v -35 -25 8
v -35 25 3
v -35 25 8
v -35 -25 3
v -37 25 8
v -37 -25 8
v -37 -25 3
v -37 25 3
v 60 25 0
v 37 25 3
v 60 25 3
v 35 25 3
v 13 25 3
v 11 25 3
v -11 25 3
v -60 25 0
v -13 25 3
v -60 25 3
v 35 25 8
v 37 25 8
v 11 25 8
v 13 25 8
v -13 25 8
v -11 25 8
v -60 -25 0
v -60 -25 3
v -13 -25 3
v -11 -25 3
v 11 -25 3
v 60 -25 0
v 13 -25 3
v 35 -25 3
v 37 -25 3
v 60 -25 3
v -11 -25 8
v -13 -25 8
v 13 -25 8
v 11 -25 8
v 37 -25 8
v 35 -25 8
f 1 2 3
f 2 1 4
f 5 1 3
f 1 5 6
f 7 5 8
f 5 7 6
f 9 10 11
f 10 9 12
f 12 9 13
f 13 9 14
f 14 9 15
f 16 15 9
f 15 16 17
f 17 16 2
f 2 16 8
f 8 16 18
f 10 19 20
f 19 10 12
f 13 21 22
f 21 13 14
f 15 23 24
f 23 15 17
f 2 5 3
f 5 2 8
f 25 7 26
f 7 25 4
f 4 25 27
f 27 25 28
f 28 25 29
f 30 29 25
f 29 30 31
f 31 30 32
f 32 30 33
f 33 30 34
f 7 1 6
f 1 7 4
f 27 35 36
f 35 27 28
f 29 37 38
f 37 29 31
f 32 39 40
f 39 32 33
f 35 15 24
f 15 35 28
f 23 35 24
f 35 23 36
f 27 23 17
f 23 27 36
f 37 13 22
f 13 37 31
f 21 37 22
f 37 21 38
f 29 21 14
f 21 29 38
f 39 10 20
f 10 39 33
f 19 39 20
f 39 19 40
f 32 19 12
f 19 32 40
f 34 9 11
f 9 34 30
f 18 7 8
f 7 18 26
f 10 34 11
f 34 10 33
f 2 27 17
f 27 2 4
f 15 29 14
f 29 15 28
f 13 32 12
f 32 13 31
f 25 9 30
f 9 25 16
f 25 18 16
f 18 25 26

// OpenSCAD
// Stiffened cover panel
// Units: mm. Print orientation: plate flat on the bed, ribs pointing up (+Z).

// ---- Plate ----
plate_len   = 120;   // plate length along X
plate_wid   = 50;    // plate width along Y
plate_thk   = 3;     // plate thickness (z = 0 to 3)

// ---- Ribs ----
rib_count   = 4;     // number of ribs
rib_thk     = 2;     // rib thickness along X
rib_h       = 5;     // rib height above plate (z = 3 to 8)
rib_pitch   = plate_len / (rib_count + 1);  // 24 mm centre-to-centre spacing
rib_overlap = 0.01;  // small overlap into plate for a clean union

// ---- Model ----
union() {
    // Base plate, centred in X and Y
    translate([-plate_len/2, -plate_wid/2, 0])
        cube([plate_len, plate_wid, plate_thk]);

    // Ribs: centres at -36, -12, 12, 36 (24 mm from plate ends)
    for (i = [1 : rib_count]) {
        x_c = -plate_len/2 + i * rib_pitch;
        translate([x_c - rib_thk/2, -plate_wid/2, plate_thk - rib_overlap])
            cube([rib_thk, plate_wid, rib_h + rib_overlap]);
    }
}
